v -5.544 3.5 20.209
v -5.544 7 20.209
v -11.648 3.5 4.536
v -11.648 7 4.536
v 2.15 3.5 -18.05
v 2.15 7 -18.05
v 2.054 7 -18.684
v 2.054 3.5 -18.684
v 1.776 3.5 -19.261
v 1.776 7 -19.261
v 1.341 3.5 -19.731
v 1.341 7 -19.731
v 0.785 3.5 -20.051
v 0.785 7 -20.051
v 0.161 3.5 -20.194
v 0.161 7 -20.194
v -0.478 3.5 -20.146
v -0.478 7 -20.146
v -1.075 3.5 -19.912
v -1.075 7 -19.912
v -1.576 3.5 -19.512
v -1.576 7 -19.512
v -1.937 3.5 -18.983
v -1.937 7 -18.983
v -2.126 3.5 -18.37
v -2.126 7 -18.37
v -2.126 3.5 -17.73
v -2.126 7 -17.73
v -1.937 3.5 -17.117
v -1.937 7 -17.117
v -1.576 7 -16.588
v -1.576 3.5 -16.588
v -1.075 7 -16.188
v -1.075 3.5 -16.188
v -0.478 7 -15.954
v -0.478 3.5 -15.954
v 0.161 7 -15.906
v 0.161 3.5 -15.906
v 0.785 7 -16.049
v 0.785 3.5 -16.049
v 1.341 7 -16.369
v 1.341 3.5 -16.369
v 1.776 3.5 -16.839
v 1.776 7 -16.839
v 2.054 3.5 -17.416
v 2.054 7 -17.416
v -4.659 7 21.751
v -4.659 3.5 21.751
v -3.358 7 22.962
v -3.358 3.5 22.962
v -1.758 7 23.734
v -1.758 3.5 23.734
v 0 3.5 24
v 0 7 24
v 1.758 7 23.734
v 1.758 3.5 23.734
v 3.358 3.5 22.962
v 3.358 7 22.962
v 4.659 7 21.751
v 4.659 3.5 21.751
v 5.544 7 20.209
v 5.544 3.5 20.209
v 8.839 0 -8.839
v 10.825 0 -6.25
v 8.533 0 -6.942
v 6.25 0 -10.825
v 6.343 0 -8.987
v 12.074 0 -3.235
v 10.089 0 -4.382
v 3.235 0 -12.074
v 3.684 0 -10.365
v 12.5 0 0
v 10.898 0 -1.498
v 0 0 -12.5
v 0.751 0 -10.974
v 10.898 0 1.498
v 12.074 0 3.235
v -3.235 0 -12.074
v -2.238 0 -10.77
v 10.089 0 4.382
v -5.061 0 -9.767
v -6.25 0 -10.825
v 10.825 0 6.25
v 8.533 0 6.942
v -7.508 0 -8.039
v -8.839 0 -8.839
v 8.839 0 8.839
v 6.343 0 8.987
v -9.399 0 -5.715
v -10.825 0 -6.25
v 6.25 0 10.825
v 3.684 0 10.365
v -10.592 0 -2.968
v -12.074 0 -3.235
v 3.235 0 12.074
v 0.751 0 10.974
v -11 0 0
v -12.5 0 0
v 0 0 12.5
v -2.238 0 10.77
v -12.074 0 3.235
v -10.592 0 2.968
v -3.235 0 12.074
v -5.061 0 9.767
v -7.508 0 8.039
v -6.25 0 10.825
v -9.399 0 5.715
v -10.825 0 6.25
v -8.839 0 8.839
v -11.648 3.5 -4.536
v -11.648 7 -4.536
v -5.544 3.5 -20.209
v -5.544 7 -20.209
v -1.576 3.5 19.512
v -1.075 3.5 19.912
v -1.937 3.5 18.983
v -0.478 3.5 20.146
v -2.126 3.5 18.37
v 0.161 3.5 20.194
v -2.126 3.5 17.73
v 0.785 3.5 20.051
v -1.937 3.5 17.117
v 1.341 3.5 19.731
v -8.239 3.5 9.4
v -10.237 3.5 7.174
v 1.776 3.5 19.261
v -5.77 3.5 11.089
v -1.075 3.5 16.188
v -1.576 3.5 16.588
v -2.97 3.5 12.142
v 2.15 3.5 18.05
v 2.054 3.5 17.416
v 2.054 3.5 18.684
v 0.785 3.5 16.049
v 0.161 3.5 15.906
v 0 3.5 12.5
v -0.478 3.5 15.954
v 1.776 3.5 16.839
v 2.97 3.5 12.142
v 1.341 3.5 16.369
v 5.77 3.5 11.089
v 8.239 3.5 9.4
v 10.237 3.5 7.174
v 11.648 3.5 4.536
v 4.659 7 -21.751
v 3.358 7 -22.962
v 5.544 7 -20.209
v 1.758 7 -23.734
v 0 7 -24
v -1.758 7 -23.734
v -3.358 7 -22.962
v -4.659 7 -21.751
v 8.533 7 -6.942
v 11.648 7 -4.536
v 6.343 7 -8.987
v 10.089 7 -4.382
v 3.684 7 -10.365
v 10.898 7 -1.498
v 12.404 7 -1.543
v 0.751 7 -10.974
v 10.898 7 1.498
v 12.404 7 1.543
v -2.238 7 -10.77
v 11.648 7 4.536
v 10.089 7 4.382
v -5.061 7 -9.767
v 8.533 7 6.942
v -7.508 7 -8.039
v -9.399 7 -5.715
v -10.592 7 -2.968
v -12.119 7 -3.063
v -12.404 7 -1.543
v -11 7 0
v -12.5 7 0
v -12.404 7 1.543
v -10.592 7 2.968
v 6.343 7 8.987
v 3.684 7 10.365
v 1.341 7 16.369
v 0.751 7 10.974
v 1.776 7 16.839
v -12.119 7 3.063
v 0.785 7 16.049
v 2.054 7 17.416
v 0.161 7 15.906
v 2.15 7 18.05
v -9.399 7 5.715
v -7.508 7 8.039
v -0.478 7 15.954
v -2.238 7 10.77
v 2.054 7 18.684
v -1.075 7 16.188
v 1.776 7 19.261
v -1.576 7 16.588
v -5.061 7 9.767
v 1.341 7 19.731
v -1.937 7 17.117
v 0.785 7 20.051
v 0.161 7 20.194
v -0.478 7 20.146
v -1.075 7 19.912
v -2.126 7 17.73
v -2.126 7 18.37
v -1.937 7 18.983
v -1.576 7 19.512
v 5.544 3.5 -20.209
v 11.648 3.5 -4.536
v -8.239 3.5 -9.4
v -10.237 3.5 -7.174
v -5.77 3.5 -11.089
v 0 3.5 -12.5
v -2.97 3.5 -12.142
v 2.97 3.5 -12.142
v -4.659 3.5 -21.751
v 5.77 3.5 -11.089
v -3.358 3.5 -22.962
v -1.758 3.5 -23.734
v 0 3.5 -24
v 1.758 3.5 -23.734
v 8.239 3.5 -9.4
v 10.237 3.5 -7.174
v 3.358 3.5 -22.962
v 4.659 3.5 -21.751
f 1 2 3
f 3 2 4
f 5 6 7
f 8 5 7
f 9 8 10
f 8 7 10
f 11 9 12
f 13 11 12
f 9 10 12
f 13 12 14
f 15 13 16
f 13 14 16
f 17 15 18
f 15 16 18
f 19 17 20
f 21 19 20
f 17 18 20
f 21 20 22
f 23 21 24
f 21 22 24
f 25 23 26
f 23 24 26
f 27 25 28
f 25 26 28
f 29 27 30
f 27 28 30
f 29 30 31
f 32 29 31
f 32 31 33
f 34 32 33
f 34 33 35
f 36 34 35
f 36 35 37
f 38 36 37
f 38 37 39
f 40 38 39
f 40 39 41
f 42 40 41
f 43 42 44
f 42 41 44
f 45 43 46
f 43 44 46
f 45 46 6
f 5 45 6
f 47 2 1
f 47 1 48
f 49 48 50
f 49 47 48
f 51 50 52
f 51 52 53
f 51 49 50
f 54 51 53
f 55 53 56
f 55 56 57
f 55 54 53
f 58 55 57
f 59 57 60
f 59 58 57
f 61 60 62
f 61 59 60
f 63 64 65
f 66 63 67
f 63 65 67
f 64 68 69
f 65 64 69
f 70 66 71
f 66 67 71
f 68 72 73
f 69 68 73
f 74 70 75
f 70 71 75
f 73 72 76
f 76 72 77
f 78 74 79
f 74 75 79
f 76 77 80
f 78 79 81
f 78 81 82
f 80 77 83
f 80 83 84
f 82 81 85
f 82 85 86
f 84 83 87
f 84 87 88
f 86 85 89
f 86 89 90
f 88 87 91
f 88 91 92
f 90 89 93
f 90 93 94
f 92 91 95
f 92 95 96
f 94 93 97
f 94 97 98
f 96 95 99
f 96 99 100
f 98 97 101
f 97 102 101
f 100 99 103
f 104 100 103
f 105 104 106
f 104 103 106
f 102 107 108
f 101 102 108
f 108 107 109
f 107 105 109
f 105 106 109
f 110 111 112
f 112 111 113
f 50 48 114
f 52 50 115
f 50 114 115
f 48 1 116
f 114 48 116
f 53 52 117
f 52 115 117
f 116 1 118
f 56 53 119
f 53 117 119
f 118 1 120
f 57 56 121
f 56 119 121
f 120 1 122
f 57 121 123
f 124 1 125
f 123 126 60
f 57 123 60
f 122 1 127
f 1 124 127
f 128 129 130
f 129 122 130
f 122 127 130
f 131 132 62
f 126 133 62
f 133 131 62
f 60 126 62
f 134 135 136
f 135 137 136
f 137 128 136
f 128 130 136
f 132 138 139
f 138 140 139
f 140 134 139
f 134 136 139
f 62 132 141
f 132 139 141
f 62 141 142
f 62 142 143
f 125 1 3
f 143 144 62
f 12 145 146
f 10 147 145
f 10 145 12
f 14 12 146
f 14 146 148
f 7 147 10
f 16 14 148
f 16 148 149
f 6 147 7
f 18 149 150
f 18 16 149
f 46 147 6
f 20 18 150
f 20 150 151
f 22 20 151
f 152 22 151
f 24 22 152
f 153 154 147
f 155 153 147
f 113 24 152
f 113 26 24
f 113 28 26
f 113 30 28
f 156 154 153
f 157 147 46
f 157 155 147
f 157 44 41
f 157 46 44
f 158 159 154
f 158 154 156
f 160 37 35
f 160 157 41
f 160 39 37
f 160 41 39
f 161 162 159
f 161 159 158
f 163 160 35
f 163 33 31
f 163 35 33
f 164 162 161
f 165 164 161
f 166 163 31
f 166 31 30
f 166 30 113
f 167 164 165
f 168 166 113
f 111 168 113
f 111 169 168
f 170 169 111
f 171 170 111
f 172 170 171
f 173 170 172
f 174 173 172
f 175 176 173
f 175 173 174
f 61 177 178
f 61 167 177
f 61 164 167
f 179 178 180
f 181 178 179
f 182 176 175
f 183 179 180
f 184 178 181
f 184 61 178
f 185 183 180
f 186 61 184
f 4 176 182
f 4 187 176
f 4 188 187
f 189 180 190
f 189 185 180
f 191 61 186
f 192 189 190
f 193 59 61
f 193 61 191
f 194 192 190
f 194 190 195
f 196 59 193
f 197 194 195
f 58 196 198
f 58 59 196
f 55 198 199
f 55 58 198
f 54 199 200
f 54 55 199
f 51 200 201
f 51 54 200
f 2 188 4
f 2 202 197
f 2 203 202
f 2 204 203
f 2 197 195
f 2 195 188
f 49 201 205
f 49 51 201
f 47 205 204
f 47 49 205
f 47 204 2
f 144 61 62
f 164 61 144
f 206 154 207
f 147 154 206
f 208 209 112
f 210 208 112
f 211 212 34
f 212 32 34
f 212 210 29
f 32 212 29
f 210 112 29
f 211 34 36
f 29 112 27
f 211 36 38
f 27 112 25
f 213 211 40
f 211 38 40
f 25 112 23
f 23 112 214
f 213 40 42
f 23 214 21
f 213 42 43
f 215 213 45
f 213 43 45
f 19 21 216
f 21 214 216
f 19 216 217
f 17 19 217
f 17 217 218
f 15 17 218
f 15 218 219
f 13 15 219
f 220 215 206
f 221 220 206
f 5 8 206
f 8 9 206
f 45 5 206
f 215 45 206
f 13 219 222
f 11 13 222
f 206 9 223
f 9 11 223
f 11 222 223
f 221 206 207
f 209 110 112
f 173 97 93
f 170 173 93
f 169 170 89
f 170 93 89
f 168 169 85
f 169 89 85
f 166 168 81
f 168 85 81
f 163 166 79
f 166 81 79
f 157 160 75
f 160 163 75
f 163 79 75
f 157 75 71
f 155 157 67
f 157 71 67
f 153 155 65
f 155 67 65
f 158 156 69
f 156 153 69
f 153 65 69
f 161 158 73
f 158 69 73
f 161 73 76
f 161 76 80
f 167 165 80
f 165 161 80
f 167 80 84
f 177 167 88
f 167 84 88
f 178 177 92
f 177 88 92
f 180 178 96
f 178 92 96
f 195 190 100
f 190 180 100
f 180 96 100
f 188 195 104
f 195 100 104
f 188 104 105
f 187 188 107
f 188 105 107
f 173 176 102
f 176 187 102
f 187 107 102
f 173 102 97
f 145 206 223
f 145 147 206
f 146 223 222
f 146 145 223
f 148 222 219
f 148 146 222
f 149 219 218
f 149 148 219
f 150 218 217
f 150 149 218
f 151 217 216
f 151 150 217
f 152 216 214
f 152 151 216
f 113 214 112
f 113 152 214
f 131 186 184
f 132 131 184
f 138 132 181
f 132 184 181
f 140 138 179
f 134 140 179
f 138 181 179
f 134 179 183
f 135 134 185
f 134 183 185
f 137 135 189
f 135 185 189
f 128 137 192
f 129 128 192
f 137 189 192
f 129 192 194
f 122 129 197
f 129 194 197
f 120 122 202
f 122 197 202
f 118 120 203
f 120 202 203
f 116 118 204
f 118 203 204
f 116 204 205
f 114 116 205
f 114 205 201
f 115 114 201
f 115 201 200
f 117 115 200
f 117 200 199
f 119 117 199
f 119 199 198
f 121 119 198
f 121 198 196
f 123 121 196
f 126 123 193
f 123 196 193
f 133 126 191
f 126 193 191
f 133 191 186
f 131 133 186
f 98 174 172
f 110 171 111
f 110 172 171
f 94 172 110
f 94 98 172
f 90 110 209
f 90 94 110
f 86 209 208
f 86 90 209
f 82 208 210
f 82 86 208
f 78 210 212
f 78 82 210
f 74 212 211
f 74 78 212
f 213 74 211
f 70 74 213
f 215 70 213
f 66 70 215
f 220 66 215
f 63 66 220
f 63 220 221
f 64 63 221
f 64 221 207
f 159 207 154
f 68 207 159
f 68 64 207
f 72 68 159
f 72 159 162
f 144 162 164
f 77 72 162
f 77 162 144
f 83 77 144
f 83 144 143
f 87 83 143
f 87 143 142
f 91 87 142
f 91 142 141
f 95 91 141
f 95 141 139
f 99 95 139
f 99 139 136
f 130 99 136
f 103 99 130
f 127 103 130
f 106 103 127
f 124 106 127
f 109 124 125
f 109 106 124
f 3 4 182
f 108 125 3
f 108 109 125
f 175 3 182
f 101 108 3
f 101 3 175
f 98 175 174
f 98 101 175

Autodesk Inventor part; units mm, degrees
ref_plane "YZ Plane" through (0, 0, 0) normal (1, 0, 0) x (0, 1, 0)
ref_plane "XZ Plane" through (0, 0, 0) normal (0, 1, 0) x (-1, 0, 0)
ref_plane "XY Plane" through (0, 0, 0) normal (0, 0, 1) x (1, 0, 0)
sketch "Sketch1" plane through (0, 0, 0) normal (0, 1, 0) x (-1, 0, 0)
  circle A0 centre (0, 0) radius 11
  circle A1 centre (0, 0) radius 12.5
  dimension "d0" = 22
  dimension "d1" = 25
extrude "Extrusion1" add sketch "Sketch1" along normal blind 7
sketch "Sketch2" plane through (0, 7, 0) normal (0, 1, 0) x (1, 0, 0)
  circle A0 centre (0, -18.05) radius 2.15
  circle A1 centre (0, 18.05) radius 2.15
  circle A2 centre (0, -18.05) radius 5.95
  circle A3 centre (0, 18.05) radius 5.95
  line L0 (-5.5444, -20.2091) -> (-11.6479, -4.536)
  line L1 (5.5444, -20.2091) -> (11.6479, -4.536)
  line L2 (-11.6479, 4.536) -> (-5.5444, 20.2091)
  line L3 (11.6479, 4.536) -> (5.5444, 20.2091)
  circle A4 centre (0, 0) radius 12.5 projected
  dimension "d4" = 4.3
  dimension "d5" = 4.3
  dimension "d6" = 0
  dimension "d7" = 0
  dimension "d8" = 18.05
  dimension "d9" = 18.05
  dimension "d10" = 3.8
  dimension "d11" = 3.8
extrude "Extrusion2" add sketch "Sketch2" against normal blind 3.5 contours A2 A4 | L0 A4 A2 | A2 A4 L1 | L2 A3 A4 | A3 A4 | A4 A3 L3 picked at (3.4679, -21.155) picked at (3.4679, 21.155)
properties part number "chumacera"
